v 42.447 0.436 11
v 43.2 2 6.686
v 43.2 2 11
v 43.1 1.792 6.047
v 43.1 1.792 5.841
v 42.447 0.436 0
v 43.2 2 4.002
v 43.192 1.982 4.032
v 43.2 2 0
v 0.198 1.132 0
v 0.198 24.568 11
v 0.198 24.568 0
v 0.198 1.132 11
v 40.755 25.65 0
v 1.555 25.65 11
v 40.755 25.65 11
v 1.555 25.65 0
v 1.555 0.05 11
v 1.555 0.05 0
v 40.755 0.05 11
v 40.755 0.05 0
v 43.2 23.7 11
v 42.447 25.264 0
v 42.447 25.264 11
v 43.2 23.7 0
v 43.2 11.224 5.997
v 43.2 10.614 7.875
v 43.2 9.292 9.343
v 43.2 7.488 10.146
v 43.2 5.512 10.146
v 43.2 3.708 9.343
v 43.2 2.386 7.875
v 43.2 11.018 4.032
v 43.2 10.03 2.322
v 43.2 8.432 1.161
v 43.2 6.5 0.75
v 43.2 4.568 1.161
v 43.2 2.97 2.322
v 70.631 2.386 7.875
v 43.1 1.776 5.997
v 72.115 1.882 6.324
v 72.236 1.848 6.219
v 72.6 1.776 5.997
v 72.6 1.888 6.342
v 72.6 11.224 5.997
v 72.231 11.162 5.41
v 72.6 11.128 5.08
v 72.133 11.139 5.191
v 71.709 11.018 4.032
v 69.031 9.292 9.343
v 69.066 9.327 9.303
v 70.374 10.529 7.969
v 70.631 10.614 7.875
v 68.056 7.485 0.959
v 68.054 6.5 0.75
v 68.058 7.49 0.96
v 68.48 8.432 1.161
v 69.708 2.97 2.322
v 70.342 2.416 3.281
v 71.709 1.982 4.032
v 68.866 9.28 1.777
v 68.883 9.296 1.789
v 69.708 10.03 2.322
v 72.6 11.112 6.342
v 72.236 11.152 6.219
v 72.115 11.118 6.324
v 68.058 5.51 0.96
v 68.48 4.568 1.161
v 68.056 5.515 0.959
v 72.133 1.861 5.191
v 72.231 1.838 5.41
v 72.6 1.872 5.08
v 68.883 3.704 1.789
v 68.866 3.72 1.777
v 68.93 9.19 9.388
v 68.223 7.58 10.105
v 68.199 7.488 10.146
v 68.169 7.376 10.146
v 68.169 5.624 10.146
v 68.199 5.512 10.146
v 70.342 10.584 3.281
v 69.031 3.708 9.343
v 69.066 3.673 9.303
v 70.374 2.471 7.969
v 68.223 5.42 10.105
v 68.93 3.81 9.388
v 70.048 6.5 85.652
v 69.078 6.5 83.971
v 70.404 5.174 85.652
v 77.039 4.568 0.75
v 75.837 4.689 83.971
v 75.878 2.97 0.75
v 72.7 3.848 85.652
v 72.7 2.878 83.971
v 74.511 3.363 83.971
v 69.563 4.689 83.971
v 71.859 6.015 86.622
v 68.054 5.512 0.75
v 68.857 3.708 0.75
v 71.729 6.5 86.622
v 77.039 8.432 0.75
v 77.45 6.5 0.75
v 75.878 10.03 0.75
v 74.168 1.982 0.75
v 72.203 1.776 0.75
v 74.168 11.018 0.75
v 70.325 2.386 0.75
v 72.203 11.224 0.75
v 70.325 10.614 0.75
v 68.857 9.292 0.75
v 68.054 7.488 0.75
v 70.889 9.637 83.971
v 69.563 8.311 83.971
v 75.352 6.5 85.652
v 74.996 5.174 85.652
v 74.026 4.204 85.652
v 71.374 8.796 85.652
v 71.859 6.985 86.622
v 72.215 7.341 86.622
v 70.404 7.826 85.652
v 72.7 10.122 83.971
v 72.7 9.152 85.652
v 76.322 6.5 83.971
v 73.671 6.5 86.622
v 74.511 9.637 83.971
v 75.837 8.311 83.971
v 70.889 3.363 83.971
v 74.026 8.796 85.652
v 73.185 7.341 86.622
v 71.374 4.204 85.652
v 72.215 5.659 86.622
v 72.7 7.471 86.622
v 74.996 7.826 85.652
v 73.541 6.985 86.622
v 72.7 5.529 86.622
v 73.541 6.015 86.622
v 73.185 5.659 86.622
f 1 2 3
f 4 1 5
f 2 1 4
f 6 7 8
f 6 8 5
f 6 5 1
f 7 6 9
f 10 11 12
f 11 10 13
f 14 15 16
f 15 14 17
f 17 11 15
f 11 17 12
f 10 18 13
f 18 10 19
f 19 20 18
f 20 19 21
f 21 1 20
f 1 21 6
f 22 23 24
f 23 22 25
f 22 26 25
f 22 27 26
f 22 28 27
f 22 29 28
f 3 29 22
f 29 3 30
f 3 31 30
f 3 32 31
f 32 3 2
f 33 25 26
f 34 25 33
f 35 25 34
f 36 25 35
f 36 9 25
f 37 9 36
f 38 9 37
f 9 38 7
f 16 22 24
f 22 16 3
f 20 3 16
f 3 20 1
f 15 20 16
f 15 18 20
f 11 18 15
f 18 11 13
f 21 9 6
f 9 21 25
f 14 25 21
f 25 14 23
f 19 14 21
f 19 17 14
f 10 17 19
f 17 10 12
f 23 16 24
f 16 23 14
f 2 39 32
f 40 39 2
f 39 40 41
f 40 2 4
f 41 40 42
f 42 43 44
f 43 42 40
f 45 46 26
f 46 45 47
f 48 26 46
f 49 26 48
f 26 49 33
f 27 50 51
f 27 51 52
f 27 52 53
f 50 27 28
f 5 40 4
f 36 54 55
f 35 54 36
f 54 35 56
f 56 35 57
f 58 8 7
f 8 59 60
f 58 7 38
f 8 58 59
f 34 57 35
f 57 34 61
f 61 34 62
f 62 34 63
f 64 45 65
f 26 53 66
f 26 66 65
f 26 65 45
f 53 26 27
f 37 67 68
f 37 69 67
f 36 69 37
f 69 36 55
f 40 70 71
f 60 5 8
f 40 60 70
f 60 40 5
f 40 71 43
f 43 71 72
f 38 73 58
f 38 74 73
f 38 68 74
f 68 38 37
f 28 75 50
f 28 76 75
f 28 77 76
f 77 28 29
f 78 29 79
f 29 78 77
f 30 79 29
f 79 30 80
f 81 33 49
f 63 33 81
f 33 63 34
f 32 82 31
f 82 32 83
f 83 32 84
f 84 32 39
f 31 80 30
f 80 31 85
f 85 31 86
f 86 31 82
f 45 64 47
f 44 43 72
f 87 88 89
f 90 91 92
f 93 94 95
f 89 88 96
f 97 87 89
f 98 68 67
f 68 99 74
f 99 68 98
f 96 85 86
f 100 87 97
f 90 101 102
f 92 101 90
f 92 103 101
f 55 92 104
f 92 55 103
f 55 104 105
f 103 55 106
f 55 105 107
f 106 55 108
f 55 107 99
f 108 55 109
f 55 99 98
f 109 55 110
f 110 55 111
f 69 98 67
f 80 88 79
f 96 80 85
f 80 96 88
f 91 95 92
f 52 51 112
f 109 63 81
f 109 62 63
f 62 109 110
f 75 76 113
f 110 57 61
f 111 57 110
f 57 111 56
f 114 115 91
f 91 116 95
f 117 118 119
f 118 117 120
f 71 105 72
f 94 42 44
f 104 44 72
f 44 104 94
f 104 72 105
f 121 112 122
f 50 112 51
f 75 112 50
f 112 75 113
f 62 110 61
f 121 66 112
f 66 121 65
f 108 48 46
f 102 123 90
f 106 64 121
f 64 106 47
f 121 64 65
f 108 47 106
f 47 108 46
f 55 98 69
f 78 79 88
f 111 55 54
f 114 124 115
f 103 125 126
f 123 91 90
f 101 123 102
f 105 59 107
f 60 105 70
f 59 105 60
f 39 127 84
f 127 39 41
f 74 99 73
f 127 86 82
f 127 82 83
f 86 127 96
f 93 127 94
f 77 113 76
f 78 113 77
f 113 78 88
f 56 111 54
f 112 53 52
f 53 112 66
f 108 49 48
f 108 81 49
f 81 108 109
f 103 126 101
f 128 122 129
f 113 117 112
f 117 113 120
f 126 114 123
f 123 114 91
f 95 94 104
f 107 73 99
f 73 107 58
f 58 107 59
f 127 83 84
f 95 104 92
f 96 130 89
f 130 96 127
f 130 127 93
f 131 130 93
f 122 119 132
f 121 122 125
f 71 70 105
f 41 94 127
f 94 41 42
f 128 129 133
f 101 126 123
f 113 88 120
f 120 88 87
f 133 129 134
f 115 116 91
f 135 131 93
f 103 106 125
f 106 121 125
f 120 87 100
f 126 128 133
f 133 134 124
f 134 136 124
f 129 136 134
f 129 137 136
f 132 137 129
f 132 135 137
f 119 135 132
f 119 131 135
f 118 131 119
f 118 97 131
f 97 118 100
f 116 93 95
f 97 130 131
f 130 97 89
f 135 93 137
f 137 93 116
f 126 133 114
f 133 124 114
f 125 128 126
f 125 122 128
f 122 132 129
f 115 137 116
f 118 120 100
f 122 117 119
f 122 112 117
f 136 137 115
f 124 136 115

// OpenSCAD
/**
 * Electronic devices for pixhawk https://pixhawk.org
 * 
 * Created by Diego Viejo
 * 
 */

//pixhawk();
telemetry();

//82x44x15
module pixhawk()

{
    union()
    {
        difference()
        {
            color([0.2, 0.2, 0.2]) cube([82, 44, 15]);
        
            color([0.2, 0.2, 0.2]) translate([0, 0, 13]) rotate([-45, 0, 0]) translate([-1, -15, 0])
                cube([82+2,15, 15]);
            color([0.2, 0.2, 0.2]) translate([0, 44, 13]) rotate([45, 0, 0]) translate([-1, 0, 0]) 
                cube([82+2,15, 15]);
            color([0.2, 0.2, 0.2]) translate([0, 0, 13]) rotate([0, 45, 0]) translate([-15, -1, 0]) 
                cube([15,44+2, 15]);
            color([0.2, 0.2, 0.2]) translate([82, 0, 13]) rotate([0, -45, 0]) translate([0, -1, 0]) 
                cube([15,44+2, 15]);
        
            color([0.2, 0.2, 0.2]) translate([-1, 1.5, 1.5]) cube([1+7.2, 44 - 1.5*2, 8]);
        
        }
        for(j=[1:3]) for(i=[1:16])
        {
            translate([0, 2.56*i, 2.56*j]) rotate([0, 90, 0]) cylinder(d=0.75, h=7.5);
        }
    }
}

//telemetry
//43.2x25.7x11 + antenna: hor 9.5x29.5 vert d1=9.5 d2=7.5 l=86
module telemetry()
color([0.2, 0.2, 0.2]) union()
{
    hull()
    {
        translate([2, 2, 0]) cylinder(r=2, h=11);
        translate([43.2-2, 2, 0]) cylinder(r=2, h=11);
        translate([2, 25.7-2, 0]) cylinder(r=2, h=11);
        translate([43.2-2, 25.7-2, 0]) cylinder(r=2, h=11);
    }
    
    translate([43.2-0.1, 6.5, 11/2]) rotate([0, 90, 0]) cylinder(d=9.5, h=29.5);
    
    hull()
    {
        translate([43.2+29.5, 6.5, (11-9.5)/2]) cylinder(d1=9.5, h=2);
        translate([43.2+29.5, 6.5, (11-9.5)/2+86-7.5/2]) sphere(d=7.5);
    }
}
